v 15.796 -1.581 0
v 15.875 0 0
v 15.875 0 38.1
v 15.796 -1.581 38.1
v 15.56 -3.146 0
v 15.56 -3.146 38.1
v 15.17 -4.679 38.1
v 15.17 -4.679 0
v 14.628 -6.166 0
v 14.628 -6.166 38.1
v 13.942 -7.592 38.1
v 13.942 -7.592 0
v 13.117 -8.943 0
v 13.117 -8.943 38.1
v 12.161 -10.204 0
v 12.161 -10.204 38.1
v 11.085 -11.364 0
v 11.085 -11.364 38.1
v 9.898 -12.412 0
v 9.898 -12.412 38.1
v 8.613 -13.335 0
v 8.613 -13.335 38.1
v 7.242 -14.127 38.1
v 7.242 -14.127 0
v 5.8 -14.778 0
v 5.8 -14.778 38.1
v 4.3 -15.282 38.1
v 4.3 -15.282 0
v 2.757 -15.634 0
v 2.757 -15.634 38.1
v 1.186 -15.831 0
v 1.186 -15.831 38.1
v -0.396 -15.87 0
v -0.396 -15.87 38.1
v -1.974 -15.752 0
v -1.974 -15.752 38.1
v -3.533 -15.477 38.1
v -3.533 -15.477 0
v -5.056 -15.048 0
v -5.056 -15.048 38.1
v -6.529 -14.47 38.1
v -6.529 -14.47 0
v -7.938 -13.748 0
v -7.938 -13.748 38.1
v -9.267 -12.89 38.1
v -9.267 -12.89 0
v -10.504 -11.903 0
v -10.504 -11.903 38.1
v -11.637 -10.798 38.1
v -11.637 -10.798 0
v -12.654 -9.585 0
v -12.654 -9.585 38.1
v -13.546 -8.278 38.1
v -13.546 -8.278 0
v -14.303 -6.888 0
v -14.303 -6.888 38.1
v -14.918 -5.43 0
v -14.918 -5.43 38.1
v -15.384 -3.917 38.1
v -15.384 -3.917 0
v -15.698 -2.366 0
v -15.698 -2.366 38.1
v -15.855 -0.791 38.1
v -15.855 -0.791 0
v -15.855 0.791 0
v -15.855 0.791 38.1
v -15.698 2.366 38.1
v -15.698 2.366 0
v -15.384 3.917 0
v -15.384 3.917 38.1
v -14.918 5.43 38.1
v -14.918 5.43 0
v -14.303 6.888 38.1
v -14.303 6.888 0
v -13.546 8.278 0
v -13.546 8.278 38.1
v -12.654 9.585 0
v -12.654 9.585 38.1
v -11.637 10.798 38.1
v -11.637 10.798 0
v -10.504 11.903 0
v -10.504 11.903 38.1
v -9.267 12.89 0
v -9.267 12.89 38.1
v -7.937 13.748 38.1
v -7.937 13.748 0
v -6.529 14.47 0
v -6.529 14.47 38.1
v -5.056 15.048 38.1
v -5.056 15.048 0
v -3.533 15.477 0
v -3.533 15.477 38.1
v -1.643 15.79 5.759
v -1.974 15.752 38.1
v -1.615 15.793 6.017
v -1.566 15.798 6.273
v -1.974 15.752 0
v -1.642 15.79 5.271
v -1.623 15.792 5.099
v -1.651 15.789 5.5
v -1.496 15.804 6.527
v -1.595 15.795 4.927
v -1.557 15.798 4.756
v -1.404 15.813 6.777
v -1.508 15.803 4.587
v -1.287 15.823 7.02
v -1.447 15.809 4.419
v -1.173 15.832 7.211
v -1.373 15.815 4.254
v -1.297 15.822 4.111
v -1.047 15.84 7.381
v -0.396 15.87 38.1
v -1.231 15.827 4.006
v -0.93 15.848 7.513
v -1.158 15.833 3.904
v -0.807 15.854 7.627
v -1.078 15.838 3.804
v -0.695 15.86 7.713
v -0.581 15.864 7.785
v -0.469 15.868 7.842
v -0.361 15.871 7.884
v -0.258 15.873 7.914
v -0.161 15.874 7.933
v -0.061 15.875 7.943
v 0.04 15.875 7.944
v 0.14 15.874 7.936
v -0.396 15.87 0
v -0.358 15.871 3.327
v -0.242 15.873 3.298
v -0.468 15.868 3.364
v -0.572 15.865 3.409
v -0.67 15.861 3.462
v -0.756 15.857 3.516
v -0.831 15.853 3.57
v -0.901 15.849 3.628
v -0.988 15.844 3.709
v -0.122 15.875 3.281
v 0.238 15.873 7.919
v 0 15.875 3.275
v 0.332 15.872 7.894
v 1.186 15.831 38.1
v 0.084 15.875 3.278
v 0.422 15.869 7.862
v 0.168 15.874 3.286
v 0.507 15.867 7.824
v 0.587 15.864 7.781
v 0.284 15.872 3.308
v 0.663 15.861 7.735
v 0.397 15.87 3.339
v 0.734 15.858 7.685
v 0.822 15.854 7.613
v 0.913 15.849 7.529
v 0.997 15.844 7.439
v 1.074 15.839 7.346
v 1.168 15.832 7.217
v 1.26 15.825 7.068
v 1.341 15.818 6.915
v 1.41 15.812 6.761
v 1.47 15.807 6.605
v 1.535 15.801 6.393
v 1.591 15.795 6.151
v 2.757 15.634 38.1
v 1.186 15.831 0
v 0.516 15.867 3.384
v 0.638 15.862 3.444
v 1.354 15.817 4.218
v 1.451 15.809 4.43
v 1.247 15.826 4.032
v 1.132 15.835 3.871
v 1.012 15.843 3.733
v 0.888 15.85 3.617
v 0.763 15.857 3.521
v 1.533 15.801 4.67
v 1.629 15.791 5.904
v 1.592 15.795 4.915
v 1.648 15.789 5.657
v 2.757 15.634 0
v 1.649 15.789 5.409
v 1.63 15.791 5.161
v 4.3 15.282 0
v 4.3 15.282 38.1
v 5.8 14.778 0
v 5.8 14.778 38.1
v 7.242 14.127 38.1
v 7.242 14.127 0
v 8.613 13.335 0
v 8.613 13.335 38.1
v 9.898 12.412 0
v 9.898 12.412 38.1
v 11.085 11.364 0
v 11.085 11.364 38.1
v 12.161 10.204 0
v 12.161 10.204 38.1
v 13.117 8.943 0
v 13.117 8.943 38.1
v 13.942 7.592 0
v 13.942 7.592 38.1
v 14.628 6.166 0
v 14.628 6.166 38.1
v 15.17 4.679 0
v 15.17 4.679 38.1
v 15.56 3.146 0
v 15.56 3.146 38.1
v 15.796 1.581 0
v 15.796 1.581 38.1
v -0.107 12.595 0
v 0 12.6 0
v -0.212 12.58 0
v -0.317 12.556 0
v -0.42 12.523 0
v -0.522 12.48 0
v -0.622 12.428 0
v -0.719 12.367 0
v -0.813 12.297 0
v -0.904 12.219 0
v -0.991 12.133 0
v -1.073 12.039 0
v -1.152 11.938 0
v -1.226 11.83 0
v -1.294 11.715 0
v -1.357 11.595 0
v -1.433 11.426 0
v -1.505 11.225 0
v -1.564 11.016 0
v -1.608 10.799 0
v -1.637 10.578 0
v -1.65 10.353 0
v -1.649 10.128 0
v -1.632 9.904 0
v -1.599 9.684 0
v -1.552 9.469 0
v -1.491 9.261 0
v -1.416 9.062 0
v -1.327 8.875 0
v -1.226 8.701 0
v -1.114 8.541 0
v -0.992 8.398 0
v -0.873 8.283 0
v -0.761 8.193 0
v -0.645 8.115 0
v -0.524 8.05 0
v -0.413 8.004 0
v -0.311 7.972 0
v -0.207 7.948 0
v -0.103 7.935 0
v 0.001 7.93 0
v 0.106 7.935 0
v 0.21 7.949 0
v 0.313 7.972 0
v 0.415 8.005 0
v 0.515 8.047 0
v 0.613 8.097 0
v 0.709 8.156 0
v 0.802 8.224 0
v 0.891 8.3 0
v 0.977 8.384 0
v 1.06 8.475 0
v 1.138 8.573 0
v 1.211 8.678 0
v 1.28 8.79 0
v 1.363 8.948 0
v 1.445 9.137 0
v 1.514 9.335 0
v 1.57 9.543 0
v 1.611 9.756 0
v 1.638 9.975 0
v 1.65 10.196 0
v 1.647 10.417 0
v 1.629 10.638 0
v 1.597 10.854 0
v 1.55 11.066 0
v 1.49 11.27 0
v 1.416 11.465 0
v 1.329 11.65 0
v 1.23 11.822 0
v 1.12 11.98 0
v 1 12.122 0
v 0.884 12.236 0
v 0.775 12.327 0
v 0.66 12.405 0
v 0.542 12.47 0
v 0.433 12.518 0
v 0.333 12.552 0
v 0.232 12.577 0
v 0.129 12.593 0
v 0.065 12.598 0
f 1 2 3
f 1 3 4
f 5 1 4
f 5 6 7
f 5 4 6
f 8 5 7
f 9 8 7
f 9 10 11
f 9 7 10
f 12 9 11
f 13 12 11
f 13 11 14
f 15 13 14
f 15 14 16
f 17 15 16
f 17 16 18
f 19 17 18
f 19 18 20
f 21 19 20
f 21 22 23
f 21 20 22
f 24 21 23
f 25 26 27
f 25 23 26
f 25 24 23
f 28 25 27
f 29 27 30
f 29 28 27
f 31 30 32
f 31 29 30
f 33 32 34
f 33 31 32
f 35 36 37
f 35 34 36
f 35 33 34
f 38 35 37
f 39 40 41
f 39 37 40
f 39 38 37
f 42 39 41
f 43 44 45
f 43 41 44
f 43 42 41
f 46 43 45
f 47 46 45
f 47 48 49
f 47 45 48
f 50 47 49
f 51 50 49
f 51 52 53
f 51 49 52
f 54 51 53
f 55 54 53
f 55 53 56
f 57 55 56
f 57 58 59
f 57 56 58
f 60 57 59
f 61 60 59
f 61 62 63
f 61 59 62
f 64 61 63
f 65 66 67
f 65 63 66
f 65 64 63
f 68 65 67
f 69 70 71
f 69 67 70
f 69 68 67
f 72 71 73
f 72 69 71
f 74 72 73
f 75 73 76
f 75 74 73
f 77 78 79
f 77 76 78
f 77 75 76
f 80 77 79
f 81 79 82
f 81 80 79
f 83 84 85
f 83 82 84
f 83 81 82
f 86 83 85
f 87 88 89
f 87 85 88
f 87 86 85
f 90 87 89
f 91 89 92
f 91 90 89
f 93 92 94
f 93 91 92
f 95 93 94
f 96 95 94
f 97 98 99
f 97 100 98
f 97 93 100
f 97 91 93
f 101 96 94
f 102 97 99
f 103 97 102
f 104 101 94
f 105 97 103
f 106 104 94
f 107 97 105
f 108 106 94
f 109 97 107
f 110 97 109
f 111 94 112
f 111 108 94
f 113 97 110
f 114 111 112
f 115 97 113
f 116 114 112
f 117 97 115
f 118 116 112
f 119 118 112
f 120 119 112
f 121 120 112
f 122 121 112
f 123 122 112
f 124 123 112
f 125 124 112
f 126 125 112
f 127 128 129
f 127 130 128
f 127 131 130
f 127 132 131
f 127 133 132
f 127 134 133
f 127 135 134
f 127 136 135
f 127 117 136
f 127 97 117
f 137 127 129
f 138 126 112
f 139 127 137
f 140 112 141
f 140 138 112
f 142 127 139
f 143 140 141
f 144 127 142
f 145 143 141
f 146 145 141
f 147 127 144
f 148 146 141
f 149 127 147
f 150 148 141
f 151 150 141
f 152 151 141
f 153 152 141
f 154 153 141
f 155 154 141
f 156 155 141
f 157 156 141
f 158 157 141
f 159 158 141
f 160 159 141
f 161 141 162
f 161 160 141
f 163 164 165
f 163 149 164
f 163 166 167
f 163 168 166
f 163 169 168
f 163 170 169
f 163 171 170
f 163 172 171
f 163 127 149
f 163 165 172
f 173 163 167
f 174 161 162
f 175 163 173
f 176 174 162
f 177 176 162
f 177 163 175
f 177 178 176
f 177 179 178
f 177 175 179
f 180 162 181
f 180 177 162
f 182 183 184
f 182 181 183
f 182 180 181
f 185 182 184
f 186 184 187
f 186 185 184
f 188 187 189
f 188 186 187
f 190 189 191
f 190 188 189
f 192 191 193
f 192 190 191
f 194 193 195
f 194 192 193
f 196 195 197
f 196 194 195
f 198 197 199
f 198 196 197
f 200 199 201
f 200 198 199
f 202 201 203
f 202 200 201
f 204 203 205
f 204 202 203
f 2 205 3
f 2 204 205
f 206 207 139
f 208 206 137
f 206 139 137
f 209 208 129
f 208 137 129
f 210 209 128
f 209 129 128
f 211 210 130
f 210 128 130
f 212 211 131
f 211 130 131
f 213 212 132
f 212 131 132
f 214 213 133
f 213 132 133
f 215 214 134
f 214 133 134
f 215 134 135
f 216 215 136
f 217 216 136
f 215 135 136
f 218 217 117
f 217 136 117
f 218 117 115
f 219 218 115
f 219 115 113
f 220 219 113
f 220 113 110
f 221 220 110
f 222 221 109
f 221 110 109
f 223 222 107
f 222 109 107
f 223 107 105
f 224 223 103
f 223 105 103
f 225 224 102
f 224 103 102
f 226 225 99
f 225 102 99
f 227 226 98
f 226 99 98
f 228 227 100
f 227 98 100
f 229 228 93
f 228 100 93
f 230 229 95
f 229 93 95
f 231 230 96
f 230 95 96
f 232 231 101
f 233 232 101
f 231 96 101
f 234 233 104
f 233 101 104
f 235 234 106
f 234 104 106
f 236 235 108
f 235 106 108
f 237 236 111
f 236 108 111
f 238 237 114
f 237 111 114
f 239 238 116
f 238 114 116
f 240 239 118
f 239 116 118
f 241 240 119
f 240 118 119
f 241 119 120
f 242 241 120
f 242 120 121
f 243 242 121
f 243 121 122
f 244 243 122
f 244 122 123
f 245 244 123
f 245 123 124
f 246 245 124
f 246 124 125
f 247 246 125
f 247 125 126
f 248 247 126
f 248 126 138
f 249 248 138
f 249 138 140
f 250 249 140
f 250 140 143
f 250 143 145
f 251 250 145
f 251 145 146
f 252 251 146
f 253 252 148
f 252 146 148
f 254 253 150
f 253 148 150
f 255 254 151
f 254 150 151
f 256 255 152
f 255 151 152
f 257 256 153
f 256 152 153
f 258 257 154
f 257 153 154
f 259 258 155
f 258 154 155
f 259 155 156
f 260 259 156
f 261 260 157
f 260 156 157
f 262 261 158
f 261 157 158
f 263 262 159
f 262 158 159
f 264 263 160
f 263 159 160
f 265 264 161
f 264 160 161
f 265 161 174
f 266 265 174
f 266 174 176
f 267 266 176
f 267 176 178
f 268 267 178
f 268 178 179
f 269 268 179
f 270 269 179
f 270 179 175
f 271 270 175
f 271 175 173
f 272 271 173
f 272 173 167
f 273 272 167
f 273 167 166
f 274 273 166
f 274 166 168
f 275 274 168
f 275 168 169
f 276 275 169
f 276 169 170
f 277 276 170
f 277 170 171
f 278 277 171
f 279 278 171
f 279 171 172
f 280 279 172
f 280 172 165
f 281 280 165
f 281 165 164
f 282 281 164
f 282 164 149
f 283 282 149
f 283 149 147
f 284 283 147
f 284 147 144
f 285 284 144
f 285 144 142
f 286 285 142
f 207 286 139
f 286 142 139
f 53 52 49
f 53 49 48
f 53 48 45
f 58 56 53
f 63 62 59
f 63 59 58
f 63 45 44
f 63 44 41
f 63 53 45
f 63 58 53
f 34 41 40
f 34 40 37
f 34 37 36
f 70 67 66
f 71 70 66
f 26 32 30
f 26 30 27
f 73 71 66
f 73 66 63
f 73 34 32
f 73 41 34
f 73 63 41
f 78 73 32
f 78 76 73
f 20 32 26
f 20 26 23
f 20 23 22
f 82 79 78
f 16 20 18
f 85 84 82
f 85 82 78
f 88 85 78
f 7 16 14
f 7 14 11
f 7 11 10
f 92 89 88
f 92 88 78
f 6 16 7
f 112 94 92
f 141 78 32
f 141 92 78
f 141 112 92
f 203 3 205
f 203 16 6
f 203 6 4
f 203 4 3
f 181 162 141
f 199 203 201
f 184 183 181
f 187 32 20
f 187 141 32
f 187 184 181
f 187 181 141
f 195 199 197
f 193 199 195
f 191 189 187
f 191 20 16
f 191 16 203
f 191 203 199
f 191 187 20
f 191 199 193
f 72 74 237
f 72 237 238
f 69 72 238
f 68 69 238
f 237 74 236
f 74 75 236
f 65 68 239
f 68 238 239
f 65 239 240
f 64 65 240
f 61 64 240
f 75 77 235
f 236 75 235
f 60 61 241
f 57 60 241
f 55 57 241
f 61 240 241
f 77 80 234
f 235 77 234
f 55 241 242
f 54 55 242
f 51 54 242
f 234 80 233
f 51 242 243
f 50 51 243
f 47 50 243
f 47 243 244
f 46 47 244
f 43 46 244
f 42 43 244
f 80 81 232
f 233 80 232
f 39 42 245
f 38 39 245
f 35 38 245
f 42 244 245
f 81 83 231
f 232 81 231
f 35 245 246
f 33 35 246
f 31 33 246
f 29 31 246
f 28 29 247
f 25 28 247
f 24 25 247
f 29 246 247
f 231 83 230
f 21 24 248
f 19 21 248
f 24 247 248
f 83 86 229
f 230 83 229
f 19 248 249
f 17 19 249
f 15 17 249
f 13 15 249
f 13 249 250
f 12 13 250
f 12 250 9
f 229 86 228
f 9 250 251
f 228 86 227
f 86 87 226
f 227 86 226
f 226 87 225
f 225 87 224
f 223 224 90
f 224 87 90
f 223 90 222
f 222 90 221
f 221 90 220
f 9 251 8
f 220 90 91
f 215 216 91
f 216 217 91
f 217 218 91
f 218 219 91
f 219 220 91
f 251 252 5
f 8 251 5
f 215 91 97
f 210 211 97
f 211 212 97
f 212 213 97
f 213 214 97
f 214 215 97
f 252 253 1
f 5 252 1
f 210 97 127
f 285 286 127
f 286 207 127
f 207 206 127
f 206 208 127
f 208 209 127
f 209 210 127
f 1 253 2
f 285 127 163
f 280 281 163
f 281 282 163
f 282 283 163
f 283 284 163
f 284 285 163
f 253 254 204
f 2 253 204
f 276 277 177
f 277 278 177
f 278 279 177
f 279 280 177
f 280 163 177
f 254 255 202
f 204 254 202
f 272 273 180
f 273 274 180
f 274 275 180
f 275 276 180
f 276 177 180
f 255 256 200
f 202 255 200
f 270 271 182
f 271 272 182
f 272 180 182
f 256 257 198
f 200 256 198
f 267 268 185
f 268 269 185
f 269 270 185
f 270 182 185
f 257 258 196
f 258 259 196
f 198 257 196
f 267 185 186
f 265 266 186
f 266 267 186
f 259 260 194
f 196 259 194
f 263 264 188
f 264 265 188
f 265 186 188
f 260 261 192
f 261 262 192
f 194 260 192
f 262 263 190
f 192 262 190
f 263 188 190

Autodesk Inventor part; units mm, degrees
ref_plane "YZ Plane" through (0, 0, 0) normal (1, 0, 0) x (0, 1, 0)
ref_plane "XY Plane" through (0, 0, 0) normal (0, 0, 1) x (1, 0, 0)
sketch "Sketch1" plane through (0, 0, 0) normal (0, 0, 1) x (1, 0, 0)
  circle A0 centre (0, 0) radius 15.875
  dimension "d0" = 31.75
extrude "Extrusion1" add sketch "Sketch1" along normal blind 38.1
ref_plane "Work Plane2" through (0, 15.875, 0) normal (0, 1, 0) x (-1, 0, 0)
sketch "Sketch4" plane through (0, 15.875, 0) normal (0, 1, 0) x (-1, 0, 0)
  circle A0 centre (0, 7.62) radius 1.4605
  point P0 (0, 0)
  dimension "d6" = 2.921
  dimension "d7" = 7.62
sketch "Sketch5" plane through (0, 0, 0) normal (0, 0, -1) x (-1, 0, 0)
  circle A0 centre (0, 0) radius 15.875 projected
  circle A1 centre (0, 8.255) radius 1.4605
  line L0 (0, 15.875) -> (14.2875, 15.875)
  dimension "d8" = 2.921
  dimension "d9" = 7.62
ref_plane "Work Plane3" through (0, 15.875, 0) normal (0, 0.7071, 0.7071) x (-1, 0, 0)
sketch "Sketch6" plane through (0, 15.875, 0) normal (0, 0.7071, 0.7071) x (-1, 0, 0)
  circle A0 centre (0, 3.9683) radius 1.5875
  point P0 (0, 11.2253)
  dimension "d11" = 3.175
extrude "Extrusion2" add sketch "Sketch6" along normal mid plane 25.4
sketch "Sketch7" plane through (0, 4.0887, -6.1742) normal (0, -0.7071, -0.7071) x (-1, 0, 0)
  circle A0 centre (0, 0) radius 1.5875 projected
  circle A1 centre (0, 0) radius 1.5875 projected
  point P0 (0, -7.257)
hole "Hole1" at (-0.0004, 4.0897, -6.1752) direction (0, 0.7071, 0.7071) diameter 3.302 depth 25.4 tip angle 118
properties part number "Aluminum"
